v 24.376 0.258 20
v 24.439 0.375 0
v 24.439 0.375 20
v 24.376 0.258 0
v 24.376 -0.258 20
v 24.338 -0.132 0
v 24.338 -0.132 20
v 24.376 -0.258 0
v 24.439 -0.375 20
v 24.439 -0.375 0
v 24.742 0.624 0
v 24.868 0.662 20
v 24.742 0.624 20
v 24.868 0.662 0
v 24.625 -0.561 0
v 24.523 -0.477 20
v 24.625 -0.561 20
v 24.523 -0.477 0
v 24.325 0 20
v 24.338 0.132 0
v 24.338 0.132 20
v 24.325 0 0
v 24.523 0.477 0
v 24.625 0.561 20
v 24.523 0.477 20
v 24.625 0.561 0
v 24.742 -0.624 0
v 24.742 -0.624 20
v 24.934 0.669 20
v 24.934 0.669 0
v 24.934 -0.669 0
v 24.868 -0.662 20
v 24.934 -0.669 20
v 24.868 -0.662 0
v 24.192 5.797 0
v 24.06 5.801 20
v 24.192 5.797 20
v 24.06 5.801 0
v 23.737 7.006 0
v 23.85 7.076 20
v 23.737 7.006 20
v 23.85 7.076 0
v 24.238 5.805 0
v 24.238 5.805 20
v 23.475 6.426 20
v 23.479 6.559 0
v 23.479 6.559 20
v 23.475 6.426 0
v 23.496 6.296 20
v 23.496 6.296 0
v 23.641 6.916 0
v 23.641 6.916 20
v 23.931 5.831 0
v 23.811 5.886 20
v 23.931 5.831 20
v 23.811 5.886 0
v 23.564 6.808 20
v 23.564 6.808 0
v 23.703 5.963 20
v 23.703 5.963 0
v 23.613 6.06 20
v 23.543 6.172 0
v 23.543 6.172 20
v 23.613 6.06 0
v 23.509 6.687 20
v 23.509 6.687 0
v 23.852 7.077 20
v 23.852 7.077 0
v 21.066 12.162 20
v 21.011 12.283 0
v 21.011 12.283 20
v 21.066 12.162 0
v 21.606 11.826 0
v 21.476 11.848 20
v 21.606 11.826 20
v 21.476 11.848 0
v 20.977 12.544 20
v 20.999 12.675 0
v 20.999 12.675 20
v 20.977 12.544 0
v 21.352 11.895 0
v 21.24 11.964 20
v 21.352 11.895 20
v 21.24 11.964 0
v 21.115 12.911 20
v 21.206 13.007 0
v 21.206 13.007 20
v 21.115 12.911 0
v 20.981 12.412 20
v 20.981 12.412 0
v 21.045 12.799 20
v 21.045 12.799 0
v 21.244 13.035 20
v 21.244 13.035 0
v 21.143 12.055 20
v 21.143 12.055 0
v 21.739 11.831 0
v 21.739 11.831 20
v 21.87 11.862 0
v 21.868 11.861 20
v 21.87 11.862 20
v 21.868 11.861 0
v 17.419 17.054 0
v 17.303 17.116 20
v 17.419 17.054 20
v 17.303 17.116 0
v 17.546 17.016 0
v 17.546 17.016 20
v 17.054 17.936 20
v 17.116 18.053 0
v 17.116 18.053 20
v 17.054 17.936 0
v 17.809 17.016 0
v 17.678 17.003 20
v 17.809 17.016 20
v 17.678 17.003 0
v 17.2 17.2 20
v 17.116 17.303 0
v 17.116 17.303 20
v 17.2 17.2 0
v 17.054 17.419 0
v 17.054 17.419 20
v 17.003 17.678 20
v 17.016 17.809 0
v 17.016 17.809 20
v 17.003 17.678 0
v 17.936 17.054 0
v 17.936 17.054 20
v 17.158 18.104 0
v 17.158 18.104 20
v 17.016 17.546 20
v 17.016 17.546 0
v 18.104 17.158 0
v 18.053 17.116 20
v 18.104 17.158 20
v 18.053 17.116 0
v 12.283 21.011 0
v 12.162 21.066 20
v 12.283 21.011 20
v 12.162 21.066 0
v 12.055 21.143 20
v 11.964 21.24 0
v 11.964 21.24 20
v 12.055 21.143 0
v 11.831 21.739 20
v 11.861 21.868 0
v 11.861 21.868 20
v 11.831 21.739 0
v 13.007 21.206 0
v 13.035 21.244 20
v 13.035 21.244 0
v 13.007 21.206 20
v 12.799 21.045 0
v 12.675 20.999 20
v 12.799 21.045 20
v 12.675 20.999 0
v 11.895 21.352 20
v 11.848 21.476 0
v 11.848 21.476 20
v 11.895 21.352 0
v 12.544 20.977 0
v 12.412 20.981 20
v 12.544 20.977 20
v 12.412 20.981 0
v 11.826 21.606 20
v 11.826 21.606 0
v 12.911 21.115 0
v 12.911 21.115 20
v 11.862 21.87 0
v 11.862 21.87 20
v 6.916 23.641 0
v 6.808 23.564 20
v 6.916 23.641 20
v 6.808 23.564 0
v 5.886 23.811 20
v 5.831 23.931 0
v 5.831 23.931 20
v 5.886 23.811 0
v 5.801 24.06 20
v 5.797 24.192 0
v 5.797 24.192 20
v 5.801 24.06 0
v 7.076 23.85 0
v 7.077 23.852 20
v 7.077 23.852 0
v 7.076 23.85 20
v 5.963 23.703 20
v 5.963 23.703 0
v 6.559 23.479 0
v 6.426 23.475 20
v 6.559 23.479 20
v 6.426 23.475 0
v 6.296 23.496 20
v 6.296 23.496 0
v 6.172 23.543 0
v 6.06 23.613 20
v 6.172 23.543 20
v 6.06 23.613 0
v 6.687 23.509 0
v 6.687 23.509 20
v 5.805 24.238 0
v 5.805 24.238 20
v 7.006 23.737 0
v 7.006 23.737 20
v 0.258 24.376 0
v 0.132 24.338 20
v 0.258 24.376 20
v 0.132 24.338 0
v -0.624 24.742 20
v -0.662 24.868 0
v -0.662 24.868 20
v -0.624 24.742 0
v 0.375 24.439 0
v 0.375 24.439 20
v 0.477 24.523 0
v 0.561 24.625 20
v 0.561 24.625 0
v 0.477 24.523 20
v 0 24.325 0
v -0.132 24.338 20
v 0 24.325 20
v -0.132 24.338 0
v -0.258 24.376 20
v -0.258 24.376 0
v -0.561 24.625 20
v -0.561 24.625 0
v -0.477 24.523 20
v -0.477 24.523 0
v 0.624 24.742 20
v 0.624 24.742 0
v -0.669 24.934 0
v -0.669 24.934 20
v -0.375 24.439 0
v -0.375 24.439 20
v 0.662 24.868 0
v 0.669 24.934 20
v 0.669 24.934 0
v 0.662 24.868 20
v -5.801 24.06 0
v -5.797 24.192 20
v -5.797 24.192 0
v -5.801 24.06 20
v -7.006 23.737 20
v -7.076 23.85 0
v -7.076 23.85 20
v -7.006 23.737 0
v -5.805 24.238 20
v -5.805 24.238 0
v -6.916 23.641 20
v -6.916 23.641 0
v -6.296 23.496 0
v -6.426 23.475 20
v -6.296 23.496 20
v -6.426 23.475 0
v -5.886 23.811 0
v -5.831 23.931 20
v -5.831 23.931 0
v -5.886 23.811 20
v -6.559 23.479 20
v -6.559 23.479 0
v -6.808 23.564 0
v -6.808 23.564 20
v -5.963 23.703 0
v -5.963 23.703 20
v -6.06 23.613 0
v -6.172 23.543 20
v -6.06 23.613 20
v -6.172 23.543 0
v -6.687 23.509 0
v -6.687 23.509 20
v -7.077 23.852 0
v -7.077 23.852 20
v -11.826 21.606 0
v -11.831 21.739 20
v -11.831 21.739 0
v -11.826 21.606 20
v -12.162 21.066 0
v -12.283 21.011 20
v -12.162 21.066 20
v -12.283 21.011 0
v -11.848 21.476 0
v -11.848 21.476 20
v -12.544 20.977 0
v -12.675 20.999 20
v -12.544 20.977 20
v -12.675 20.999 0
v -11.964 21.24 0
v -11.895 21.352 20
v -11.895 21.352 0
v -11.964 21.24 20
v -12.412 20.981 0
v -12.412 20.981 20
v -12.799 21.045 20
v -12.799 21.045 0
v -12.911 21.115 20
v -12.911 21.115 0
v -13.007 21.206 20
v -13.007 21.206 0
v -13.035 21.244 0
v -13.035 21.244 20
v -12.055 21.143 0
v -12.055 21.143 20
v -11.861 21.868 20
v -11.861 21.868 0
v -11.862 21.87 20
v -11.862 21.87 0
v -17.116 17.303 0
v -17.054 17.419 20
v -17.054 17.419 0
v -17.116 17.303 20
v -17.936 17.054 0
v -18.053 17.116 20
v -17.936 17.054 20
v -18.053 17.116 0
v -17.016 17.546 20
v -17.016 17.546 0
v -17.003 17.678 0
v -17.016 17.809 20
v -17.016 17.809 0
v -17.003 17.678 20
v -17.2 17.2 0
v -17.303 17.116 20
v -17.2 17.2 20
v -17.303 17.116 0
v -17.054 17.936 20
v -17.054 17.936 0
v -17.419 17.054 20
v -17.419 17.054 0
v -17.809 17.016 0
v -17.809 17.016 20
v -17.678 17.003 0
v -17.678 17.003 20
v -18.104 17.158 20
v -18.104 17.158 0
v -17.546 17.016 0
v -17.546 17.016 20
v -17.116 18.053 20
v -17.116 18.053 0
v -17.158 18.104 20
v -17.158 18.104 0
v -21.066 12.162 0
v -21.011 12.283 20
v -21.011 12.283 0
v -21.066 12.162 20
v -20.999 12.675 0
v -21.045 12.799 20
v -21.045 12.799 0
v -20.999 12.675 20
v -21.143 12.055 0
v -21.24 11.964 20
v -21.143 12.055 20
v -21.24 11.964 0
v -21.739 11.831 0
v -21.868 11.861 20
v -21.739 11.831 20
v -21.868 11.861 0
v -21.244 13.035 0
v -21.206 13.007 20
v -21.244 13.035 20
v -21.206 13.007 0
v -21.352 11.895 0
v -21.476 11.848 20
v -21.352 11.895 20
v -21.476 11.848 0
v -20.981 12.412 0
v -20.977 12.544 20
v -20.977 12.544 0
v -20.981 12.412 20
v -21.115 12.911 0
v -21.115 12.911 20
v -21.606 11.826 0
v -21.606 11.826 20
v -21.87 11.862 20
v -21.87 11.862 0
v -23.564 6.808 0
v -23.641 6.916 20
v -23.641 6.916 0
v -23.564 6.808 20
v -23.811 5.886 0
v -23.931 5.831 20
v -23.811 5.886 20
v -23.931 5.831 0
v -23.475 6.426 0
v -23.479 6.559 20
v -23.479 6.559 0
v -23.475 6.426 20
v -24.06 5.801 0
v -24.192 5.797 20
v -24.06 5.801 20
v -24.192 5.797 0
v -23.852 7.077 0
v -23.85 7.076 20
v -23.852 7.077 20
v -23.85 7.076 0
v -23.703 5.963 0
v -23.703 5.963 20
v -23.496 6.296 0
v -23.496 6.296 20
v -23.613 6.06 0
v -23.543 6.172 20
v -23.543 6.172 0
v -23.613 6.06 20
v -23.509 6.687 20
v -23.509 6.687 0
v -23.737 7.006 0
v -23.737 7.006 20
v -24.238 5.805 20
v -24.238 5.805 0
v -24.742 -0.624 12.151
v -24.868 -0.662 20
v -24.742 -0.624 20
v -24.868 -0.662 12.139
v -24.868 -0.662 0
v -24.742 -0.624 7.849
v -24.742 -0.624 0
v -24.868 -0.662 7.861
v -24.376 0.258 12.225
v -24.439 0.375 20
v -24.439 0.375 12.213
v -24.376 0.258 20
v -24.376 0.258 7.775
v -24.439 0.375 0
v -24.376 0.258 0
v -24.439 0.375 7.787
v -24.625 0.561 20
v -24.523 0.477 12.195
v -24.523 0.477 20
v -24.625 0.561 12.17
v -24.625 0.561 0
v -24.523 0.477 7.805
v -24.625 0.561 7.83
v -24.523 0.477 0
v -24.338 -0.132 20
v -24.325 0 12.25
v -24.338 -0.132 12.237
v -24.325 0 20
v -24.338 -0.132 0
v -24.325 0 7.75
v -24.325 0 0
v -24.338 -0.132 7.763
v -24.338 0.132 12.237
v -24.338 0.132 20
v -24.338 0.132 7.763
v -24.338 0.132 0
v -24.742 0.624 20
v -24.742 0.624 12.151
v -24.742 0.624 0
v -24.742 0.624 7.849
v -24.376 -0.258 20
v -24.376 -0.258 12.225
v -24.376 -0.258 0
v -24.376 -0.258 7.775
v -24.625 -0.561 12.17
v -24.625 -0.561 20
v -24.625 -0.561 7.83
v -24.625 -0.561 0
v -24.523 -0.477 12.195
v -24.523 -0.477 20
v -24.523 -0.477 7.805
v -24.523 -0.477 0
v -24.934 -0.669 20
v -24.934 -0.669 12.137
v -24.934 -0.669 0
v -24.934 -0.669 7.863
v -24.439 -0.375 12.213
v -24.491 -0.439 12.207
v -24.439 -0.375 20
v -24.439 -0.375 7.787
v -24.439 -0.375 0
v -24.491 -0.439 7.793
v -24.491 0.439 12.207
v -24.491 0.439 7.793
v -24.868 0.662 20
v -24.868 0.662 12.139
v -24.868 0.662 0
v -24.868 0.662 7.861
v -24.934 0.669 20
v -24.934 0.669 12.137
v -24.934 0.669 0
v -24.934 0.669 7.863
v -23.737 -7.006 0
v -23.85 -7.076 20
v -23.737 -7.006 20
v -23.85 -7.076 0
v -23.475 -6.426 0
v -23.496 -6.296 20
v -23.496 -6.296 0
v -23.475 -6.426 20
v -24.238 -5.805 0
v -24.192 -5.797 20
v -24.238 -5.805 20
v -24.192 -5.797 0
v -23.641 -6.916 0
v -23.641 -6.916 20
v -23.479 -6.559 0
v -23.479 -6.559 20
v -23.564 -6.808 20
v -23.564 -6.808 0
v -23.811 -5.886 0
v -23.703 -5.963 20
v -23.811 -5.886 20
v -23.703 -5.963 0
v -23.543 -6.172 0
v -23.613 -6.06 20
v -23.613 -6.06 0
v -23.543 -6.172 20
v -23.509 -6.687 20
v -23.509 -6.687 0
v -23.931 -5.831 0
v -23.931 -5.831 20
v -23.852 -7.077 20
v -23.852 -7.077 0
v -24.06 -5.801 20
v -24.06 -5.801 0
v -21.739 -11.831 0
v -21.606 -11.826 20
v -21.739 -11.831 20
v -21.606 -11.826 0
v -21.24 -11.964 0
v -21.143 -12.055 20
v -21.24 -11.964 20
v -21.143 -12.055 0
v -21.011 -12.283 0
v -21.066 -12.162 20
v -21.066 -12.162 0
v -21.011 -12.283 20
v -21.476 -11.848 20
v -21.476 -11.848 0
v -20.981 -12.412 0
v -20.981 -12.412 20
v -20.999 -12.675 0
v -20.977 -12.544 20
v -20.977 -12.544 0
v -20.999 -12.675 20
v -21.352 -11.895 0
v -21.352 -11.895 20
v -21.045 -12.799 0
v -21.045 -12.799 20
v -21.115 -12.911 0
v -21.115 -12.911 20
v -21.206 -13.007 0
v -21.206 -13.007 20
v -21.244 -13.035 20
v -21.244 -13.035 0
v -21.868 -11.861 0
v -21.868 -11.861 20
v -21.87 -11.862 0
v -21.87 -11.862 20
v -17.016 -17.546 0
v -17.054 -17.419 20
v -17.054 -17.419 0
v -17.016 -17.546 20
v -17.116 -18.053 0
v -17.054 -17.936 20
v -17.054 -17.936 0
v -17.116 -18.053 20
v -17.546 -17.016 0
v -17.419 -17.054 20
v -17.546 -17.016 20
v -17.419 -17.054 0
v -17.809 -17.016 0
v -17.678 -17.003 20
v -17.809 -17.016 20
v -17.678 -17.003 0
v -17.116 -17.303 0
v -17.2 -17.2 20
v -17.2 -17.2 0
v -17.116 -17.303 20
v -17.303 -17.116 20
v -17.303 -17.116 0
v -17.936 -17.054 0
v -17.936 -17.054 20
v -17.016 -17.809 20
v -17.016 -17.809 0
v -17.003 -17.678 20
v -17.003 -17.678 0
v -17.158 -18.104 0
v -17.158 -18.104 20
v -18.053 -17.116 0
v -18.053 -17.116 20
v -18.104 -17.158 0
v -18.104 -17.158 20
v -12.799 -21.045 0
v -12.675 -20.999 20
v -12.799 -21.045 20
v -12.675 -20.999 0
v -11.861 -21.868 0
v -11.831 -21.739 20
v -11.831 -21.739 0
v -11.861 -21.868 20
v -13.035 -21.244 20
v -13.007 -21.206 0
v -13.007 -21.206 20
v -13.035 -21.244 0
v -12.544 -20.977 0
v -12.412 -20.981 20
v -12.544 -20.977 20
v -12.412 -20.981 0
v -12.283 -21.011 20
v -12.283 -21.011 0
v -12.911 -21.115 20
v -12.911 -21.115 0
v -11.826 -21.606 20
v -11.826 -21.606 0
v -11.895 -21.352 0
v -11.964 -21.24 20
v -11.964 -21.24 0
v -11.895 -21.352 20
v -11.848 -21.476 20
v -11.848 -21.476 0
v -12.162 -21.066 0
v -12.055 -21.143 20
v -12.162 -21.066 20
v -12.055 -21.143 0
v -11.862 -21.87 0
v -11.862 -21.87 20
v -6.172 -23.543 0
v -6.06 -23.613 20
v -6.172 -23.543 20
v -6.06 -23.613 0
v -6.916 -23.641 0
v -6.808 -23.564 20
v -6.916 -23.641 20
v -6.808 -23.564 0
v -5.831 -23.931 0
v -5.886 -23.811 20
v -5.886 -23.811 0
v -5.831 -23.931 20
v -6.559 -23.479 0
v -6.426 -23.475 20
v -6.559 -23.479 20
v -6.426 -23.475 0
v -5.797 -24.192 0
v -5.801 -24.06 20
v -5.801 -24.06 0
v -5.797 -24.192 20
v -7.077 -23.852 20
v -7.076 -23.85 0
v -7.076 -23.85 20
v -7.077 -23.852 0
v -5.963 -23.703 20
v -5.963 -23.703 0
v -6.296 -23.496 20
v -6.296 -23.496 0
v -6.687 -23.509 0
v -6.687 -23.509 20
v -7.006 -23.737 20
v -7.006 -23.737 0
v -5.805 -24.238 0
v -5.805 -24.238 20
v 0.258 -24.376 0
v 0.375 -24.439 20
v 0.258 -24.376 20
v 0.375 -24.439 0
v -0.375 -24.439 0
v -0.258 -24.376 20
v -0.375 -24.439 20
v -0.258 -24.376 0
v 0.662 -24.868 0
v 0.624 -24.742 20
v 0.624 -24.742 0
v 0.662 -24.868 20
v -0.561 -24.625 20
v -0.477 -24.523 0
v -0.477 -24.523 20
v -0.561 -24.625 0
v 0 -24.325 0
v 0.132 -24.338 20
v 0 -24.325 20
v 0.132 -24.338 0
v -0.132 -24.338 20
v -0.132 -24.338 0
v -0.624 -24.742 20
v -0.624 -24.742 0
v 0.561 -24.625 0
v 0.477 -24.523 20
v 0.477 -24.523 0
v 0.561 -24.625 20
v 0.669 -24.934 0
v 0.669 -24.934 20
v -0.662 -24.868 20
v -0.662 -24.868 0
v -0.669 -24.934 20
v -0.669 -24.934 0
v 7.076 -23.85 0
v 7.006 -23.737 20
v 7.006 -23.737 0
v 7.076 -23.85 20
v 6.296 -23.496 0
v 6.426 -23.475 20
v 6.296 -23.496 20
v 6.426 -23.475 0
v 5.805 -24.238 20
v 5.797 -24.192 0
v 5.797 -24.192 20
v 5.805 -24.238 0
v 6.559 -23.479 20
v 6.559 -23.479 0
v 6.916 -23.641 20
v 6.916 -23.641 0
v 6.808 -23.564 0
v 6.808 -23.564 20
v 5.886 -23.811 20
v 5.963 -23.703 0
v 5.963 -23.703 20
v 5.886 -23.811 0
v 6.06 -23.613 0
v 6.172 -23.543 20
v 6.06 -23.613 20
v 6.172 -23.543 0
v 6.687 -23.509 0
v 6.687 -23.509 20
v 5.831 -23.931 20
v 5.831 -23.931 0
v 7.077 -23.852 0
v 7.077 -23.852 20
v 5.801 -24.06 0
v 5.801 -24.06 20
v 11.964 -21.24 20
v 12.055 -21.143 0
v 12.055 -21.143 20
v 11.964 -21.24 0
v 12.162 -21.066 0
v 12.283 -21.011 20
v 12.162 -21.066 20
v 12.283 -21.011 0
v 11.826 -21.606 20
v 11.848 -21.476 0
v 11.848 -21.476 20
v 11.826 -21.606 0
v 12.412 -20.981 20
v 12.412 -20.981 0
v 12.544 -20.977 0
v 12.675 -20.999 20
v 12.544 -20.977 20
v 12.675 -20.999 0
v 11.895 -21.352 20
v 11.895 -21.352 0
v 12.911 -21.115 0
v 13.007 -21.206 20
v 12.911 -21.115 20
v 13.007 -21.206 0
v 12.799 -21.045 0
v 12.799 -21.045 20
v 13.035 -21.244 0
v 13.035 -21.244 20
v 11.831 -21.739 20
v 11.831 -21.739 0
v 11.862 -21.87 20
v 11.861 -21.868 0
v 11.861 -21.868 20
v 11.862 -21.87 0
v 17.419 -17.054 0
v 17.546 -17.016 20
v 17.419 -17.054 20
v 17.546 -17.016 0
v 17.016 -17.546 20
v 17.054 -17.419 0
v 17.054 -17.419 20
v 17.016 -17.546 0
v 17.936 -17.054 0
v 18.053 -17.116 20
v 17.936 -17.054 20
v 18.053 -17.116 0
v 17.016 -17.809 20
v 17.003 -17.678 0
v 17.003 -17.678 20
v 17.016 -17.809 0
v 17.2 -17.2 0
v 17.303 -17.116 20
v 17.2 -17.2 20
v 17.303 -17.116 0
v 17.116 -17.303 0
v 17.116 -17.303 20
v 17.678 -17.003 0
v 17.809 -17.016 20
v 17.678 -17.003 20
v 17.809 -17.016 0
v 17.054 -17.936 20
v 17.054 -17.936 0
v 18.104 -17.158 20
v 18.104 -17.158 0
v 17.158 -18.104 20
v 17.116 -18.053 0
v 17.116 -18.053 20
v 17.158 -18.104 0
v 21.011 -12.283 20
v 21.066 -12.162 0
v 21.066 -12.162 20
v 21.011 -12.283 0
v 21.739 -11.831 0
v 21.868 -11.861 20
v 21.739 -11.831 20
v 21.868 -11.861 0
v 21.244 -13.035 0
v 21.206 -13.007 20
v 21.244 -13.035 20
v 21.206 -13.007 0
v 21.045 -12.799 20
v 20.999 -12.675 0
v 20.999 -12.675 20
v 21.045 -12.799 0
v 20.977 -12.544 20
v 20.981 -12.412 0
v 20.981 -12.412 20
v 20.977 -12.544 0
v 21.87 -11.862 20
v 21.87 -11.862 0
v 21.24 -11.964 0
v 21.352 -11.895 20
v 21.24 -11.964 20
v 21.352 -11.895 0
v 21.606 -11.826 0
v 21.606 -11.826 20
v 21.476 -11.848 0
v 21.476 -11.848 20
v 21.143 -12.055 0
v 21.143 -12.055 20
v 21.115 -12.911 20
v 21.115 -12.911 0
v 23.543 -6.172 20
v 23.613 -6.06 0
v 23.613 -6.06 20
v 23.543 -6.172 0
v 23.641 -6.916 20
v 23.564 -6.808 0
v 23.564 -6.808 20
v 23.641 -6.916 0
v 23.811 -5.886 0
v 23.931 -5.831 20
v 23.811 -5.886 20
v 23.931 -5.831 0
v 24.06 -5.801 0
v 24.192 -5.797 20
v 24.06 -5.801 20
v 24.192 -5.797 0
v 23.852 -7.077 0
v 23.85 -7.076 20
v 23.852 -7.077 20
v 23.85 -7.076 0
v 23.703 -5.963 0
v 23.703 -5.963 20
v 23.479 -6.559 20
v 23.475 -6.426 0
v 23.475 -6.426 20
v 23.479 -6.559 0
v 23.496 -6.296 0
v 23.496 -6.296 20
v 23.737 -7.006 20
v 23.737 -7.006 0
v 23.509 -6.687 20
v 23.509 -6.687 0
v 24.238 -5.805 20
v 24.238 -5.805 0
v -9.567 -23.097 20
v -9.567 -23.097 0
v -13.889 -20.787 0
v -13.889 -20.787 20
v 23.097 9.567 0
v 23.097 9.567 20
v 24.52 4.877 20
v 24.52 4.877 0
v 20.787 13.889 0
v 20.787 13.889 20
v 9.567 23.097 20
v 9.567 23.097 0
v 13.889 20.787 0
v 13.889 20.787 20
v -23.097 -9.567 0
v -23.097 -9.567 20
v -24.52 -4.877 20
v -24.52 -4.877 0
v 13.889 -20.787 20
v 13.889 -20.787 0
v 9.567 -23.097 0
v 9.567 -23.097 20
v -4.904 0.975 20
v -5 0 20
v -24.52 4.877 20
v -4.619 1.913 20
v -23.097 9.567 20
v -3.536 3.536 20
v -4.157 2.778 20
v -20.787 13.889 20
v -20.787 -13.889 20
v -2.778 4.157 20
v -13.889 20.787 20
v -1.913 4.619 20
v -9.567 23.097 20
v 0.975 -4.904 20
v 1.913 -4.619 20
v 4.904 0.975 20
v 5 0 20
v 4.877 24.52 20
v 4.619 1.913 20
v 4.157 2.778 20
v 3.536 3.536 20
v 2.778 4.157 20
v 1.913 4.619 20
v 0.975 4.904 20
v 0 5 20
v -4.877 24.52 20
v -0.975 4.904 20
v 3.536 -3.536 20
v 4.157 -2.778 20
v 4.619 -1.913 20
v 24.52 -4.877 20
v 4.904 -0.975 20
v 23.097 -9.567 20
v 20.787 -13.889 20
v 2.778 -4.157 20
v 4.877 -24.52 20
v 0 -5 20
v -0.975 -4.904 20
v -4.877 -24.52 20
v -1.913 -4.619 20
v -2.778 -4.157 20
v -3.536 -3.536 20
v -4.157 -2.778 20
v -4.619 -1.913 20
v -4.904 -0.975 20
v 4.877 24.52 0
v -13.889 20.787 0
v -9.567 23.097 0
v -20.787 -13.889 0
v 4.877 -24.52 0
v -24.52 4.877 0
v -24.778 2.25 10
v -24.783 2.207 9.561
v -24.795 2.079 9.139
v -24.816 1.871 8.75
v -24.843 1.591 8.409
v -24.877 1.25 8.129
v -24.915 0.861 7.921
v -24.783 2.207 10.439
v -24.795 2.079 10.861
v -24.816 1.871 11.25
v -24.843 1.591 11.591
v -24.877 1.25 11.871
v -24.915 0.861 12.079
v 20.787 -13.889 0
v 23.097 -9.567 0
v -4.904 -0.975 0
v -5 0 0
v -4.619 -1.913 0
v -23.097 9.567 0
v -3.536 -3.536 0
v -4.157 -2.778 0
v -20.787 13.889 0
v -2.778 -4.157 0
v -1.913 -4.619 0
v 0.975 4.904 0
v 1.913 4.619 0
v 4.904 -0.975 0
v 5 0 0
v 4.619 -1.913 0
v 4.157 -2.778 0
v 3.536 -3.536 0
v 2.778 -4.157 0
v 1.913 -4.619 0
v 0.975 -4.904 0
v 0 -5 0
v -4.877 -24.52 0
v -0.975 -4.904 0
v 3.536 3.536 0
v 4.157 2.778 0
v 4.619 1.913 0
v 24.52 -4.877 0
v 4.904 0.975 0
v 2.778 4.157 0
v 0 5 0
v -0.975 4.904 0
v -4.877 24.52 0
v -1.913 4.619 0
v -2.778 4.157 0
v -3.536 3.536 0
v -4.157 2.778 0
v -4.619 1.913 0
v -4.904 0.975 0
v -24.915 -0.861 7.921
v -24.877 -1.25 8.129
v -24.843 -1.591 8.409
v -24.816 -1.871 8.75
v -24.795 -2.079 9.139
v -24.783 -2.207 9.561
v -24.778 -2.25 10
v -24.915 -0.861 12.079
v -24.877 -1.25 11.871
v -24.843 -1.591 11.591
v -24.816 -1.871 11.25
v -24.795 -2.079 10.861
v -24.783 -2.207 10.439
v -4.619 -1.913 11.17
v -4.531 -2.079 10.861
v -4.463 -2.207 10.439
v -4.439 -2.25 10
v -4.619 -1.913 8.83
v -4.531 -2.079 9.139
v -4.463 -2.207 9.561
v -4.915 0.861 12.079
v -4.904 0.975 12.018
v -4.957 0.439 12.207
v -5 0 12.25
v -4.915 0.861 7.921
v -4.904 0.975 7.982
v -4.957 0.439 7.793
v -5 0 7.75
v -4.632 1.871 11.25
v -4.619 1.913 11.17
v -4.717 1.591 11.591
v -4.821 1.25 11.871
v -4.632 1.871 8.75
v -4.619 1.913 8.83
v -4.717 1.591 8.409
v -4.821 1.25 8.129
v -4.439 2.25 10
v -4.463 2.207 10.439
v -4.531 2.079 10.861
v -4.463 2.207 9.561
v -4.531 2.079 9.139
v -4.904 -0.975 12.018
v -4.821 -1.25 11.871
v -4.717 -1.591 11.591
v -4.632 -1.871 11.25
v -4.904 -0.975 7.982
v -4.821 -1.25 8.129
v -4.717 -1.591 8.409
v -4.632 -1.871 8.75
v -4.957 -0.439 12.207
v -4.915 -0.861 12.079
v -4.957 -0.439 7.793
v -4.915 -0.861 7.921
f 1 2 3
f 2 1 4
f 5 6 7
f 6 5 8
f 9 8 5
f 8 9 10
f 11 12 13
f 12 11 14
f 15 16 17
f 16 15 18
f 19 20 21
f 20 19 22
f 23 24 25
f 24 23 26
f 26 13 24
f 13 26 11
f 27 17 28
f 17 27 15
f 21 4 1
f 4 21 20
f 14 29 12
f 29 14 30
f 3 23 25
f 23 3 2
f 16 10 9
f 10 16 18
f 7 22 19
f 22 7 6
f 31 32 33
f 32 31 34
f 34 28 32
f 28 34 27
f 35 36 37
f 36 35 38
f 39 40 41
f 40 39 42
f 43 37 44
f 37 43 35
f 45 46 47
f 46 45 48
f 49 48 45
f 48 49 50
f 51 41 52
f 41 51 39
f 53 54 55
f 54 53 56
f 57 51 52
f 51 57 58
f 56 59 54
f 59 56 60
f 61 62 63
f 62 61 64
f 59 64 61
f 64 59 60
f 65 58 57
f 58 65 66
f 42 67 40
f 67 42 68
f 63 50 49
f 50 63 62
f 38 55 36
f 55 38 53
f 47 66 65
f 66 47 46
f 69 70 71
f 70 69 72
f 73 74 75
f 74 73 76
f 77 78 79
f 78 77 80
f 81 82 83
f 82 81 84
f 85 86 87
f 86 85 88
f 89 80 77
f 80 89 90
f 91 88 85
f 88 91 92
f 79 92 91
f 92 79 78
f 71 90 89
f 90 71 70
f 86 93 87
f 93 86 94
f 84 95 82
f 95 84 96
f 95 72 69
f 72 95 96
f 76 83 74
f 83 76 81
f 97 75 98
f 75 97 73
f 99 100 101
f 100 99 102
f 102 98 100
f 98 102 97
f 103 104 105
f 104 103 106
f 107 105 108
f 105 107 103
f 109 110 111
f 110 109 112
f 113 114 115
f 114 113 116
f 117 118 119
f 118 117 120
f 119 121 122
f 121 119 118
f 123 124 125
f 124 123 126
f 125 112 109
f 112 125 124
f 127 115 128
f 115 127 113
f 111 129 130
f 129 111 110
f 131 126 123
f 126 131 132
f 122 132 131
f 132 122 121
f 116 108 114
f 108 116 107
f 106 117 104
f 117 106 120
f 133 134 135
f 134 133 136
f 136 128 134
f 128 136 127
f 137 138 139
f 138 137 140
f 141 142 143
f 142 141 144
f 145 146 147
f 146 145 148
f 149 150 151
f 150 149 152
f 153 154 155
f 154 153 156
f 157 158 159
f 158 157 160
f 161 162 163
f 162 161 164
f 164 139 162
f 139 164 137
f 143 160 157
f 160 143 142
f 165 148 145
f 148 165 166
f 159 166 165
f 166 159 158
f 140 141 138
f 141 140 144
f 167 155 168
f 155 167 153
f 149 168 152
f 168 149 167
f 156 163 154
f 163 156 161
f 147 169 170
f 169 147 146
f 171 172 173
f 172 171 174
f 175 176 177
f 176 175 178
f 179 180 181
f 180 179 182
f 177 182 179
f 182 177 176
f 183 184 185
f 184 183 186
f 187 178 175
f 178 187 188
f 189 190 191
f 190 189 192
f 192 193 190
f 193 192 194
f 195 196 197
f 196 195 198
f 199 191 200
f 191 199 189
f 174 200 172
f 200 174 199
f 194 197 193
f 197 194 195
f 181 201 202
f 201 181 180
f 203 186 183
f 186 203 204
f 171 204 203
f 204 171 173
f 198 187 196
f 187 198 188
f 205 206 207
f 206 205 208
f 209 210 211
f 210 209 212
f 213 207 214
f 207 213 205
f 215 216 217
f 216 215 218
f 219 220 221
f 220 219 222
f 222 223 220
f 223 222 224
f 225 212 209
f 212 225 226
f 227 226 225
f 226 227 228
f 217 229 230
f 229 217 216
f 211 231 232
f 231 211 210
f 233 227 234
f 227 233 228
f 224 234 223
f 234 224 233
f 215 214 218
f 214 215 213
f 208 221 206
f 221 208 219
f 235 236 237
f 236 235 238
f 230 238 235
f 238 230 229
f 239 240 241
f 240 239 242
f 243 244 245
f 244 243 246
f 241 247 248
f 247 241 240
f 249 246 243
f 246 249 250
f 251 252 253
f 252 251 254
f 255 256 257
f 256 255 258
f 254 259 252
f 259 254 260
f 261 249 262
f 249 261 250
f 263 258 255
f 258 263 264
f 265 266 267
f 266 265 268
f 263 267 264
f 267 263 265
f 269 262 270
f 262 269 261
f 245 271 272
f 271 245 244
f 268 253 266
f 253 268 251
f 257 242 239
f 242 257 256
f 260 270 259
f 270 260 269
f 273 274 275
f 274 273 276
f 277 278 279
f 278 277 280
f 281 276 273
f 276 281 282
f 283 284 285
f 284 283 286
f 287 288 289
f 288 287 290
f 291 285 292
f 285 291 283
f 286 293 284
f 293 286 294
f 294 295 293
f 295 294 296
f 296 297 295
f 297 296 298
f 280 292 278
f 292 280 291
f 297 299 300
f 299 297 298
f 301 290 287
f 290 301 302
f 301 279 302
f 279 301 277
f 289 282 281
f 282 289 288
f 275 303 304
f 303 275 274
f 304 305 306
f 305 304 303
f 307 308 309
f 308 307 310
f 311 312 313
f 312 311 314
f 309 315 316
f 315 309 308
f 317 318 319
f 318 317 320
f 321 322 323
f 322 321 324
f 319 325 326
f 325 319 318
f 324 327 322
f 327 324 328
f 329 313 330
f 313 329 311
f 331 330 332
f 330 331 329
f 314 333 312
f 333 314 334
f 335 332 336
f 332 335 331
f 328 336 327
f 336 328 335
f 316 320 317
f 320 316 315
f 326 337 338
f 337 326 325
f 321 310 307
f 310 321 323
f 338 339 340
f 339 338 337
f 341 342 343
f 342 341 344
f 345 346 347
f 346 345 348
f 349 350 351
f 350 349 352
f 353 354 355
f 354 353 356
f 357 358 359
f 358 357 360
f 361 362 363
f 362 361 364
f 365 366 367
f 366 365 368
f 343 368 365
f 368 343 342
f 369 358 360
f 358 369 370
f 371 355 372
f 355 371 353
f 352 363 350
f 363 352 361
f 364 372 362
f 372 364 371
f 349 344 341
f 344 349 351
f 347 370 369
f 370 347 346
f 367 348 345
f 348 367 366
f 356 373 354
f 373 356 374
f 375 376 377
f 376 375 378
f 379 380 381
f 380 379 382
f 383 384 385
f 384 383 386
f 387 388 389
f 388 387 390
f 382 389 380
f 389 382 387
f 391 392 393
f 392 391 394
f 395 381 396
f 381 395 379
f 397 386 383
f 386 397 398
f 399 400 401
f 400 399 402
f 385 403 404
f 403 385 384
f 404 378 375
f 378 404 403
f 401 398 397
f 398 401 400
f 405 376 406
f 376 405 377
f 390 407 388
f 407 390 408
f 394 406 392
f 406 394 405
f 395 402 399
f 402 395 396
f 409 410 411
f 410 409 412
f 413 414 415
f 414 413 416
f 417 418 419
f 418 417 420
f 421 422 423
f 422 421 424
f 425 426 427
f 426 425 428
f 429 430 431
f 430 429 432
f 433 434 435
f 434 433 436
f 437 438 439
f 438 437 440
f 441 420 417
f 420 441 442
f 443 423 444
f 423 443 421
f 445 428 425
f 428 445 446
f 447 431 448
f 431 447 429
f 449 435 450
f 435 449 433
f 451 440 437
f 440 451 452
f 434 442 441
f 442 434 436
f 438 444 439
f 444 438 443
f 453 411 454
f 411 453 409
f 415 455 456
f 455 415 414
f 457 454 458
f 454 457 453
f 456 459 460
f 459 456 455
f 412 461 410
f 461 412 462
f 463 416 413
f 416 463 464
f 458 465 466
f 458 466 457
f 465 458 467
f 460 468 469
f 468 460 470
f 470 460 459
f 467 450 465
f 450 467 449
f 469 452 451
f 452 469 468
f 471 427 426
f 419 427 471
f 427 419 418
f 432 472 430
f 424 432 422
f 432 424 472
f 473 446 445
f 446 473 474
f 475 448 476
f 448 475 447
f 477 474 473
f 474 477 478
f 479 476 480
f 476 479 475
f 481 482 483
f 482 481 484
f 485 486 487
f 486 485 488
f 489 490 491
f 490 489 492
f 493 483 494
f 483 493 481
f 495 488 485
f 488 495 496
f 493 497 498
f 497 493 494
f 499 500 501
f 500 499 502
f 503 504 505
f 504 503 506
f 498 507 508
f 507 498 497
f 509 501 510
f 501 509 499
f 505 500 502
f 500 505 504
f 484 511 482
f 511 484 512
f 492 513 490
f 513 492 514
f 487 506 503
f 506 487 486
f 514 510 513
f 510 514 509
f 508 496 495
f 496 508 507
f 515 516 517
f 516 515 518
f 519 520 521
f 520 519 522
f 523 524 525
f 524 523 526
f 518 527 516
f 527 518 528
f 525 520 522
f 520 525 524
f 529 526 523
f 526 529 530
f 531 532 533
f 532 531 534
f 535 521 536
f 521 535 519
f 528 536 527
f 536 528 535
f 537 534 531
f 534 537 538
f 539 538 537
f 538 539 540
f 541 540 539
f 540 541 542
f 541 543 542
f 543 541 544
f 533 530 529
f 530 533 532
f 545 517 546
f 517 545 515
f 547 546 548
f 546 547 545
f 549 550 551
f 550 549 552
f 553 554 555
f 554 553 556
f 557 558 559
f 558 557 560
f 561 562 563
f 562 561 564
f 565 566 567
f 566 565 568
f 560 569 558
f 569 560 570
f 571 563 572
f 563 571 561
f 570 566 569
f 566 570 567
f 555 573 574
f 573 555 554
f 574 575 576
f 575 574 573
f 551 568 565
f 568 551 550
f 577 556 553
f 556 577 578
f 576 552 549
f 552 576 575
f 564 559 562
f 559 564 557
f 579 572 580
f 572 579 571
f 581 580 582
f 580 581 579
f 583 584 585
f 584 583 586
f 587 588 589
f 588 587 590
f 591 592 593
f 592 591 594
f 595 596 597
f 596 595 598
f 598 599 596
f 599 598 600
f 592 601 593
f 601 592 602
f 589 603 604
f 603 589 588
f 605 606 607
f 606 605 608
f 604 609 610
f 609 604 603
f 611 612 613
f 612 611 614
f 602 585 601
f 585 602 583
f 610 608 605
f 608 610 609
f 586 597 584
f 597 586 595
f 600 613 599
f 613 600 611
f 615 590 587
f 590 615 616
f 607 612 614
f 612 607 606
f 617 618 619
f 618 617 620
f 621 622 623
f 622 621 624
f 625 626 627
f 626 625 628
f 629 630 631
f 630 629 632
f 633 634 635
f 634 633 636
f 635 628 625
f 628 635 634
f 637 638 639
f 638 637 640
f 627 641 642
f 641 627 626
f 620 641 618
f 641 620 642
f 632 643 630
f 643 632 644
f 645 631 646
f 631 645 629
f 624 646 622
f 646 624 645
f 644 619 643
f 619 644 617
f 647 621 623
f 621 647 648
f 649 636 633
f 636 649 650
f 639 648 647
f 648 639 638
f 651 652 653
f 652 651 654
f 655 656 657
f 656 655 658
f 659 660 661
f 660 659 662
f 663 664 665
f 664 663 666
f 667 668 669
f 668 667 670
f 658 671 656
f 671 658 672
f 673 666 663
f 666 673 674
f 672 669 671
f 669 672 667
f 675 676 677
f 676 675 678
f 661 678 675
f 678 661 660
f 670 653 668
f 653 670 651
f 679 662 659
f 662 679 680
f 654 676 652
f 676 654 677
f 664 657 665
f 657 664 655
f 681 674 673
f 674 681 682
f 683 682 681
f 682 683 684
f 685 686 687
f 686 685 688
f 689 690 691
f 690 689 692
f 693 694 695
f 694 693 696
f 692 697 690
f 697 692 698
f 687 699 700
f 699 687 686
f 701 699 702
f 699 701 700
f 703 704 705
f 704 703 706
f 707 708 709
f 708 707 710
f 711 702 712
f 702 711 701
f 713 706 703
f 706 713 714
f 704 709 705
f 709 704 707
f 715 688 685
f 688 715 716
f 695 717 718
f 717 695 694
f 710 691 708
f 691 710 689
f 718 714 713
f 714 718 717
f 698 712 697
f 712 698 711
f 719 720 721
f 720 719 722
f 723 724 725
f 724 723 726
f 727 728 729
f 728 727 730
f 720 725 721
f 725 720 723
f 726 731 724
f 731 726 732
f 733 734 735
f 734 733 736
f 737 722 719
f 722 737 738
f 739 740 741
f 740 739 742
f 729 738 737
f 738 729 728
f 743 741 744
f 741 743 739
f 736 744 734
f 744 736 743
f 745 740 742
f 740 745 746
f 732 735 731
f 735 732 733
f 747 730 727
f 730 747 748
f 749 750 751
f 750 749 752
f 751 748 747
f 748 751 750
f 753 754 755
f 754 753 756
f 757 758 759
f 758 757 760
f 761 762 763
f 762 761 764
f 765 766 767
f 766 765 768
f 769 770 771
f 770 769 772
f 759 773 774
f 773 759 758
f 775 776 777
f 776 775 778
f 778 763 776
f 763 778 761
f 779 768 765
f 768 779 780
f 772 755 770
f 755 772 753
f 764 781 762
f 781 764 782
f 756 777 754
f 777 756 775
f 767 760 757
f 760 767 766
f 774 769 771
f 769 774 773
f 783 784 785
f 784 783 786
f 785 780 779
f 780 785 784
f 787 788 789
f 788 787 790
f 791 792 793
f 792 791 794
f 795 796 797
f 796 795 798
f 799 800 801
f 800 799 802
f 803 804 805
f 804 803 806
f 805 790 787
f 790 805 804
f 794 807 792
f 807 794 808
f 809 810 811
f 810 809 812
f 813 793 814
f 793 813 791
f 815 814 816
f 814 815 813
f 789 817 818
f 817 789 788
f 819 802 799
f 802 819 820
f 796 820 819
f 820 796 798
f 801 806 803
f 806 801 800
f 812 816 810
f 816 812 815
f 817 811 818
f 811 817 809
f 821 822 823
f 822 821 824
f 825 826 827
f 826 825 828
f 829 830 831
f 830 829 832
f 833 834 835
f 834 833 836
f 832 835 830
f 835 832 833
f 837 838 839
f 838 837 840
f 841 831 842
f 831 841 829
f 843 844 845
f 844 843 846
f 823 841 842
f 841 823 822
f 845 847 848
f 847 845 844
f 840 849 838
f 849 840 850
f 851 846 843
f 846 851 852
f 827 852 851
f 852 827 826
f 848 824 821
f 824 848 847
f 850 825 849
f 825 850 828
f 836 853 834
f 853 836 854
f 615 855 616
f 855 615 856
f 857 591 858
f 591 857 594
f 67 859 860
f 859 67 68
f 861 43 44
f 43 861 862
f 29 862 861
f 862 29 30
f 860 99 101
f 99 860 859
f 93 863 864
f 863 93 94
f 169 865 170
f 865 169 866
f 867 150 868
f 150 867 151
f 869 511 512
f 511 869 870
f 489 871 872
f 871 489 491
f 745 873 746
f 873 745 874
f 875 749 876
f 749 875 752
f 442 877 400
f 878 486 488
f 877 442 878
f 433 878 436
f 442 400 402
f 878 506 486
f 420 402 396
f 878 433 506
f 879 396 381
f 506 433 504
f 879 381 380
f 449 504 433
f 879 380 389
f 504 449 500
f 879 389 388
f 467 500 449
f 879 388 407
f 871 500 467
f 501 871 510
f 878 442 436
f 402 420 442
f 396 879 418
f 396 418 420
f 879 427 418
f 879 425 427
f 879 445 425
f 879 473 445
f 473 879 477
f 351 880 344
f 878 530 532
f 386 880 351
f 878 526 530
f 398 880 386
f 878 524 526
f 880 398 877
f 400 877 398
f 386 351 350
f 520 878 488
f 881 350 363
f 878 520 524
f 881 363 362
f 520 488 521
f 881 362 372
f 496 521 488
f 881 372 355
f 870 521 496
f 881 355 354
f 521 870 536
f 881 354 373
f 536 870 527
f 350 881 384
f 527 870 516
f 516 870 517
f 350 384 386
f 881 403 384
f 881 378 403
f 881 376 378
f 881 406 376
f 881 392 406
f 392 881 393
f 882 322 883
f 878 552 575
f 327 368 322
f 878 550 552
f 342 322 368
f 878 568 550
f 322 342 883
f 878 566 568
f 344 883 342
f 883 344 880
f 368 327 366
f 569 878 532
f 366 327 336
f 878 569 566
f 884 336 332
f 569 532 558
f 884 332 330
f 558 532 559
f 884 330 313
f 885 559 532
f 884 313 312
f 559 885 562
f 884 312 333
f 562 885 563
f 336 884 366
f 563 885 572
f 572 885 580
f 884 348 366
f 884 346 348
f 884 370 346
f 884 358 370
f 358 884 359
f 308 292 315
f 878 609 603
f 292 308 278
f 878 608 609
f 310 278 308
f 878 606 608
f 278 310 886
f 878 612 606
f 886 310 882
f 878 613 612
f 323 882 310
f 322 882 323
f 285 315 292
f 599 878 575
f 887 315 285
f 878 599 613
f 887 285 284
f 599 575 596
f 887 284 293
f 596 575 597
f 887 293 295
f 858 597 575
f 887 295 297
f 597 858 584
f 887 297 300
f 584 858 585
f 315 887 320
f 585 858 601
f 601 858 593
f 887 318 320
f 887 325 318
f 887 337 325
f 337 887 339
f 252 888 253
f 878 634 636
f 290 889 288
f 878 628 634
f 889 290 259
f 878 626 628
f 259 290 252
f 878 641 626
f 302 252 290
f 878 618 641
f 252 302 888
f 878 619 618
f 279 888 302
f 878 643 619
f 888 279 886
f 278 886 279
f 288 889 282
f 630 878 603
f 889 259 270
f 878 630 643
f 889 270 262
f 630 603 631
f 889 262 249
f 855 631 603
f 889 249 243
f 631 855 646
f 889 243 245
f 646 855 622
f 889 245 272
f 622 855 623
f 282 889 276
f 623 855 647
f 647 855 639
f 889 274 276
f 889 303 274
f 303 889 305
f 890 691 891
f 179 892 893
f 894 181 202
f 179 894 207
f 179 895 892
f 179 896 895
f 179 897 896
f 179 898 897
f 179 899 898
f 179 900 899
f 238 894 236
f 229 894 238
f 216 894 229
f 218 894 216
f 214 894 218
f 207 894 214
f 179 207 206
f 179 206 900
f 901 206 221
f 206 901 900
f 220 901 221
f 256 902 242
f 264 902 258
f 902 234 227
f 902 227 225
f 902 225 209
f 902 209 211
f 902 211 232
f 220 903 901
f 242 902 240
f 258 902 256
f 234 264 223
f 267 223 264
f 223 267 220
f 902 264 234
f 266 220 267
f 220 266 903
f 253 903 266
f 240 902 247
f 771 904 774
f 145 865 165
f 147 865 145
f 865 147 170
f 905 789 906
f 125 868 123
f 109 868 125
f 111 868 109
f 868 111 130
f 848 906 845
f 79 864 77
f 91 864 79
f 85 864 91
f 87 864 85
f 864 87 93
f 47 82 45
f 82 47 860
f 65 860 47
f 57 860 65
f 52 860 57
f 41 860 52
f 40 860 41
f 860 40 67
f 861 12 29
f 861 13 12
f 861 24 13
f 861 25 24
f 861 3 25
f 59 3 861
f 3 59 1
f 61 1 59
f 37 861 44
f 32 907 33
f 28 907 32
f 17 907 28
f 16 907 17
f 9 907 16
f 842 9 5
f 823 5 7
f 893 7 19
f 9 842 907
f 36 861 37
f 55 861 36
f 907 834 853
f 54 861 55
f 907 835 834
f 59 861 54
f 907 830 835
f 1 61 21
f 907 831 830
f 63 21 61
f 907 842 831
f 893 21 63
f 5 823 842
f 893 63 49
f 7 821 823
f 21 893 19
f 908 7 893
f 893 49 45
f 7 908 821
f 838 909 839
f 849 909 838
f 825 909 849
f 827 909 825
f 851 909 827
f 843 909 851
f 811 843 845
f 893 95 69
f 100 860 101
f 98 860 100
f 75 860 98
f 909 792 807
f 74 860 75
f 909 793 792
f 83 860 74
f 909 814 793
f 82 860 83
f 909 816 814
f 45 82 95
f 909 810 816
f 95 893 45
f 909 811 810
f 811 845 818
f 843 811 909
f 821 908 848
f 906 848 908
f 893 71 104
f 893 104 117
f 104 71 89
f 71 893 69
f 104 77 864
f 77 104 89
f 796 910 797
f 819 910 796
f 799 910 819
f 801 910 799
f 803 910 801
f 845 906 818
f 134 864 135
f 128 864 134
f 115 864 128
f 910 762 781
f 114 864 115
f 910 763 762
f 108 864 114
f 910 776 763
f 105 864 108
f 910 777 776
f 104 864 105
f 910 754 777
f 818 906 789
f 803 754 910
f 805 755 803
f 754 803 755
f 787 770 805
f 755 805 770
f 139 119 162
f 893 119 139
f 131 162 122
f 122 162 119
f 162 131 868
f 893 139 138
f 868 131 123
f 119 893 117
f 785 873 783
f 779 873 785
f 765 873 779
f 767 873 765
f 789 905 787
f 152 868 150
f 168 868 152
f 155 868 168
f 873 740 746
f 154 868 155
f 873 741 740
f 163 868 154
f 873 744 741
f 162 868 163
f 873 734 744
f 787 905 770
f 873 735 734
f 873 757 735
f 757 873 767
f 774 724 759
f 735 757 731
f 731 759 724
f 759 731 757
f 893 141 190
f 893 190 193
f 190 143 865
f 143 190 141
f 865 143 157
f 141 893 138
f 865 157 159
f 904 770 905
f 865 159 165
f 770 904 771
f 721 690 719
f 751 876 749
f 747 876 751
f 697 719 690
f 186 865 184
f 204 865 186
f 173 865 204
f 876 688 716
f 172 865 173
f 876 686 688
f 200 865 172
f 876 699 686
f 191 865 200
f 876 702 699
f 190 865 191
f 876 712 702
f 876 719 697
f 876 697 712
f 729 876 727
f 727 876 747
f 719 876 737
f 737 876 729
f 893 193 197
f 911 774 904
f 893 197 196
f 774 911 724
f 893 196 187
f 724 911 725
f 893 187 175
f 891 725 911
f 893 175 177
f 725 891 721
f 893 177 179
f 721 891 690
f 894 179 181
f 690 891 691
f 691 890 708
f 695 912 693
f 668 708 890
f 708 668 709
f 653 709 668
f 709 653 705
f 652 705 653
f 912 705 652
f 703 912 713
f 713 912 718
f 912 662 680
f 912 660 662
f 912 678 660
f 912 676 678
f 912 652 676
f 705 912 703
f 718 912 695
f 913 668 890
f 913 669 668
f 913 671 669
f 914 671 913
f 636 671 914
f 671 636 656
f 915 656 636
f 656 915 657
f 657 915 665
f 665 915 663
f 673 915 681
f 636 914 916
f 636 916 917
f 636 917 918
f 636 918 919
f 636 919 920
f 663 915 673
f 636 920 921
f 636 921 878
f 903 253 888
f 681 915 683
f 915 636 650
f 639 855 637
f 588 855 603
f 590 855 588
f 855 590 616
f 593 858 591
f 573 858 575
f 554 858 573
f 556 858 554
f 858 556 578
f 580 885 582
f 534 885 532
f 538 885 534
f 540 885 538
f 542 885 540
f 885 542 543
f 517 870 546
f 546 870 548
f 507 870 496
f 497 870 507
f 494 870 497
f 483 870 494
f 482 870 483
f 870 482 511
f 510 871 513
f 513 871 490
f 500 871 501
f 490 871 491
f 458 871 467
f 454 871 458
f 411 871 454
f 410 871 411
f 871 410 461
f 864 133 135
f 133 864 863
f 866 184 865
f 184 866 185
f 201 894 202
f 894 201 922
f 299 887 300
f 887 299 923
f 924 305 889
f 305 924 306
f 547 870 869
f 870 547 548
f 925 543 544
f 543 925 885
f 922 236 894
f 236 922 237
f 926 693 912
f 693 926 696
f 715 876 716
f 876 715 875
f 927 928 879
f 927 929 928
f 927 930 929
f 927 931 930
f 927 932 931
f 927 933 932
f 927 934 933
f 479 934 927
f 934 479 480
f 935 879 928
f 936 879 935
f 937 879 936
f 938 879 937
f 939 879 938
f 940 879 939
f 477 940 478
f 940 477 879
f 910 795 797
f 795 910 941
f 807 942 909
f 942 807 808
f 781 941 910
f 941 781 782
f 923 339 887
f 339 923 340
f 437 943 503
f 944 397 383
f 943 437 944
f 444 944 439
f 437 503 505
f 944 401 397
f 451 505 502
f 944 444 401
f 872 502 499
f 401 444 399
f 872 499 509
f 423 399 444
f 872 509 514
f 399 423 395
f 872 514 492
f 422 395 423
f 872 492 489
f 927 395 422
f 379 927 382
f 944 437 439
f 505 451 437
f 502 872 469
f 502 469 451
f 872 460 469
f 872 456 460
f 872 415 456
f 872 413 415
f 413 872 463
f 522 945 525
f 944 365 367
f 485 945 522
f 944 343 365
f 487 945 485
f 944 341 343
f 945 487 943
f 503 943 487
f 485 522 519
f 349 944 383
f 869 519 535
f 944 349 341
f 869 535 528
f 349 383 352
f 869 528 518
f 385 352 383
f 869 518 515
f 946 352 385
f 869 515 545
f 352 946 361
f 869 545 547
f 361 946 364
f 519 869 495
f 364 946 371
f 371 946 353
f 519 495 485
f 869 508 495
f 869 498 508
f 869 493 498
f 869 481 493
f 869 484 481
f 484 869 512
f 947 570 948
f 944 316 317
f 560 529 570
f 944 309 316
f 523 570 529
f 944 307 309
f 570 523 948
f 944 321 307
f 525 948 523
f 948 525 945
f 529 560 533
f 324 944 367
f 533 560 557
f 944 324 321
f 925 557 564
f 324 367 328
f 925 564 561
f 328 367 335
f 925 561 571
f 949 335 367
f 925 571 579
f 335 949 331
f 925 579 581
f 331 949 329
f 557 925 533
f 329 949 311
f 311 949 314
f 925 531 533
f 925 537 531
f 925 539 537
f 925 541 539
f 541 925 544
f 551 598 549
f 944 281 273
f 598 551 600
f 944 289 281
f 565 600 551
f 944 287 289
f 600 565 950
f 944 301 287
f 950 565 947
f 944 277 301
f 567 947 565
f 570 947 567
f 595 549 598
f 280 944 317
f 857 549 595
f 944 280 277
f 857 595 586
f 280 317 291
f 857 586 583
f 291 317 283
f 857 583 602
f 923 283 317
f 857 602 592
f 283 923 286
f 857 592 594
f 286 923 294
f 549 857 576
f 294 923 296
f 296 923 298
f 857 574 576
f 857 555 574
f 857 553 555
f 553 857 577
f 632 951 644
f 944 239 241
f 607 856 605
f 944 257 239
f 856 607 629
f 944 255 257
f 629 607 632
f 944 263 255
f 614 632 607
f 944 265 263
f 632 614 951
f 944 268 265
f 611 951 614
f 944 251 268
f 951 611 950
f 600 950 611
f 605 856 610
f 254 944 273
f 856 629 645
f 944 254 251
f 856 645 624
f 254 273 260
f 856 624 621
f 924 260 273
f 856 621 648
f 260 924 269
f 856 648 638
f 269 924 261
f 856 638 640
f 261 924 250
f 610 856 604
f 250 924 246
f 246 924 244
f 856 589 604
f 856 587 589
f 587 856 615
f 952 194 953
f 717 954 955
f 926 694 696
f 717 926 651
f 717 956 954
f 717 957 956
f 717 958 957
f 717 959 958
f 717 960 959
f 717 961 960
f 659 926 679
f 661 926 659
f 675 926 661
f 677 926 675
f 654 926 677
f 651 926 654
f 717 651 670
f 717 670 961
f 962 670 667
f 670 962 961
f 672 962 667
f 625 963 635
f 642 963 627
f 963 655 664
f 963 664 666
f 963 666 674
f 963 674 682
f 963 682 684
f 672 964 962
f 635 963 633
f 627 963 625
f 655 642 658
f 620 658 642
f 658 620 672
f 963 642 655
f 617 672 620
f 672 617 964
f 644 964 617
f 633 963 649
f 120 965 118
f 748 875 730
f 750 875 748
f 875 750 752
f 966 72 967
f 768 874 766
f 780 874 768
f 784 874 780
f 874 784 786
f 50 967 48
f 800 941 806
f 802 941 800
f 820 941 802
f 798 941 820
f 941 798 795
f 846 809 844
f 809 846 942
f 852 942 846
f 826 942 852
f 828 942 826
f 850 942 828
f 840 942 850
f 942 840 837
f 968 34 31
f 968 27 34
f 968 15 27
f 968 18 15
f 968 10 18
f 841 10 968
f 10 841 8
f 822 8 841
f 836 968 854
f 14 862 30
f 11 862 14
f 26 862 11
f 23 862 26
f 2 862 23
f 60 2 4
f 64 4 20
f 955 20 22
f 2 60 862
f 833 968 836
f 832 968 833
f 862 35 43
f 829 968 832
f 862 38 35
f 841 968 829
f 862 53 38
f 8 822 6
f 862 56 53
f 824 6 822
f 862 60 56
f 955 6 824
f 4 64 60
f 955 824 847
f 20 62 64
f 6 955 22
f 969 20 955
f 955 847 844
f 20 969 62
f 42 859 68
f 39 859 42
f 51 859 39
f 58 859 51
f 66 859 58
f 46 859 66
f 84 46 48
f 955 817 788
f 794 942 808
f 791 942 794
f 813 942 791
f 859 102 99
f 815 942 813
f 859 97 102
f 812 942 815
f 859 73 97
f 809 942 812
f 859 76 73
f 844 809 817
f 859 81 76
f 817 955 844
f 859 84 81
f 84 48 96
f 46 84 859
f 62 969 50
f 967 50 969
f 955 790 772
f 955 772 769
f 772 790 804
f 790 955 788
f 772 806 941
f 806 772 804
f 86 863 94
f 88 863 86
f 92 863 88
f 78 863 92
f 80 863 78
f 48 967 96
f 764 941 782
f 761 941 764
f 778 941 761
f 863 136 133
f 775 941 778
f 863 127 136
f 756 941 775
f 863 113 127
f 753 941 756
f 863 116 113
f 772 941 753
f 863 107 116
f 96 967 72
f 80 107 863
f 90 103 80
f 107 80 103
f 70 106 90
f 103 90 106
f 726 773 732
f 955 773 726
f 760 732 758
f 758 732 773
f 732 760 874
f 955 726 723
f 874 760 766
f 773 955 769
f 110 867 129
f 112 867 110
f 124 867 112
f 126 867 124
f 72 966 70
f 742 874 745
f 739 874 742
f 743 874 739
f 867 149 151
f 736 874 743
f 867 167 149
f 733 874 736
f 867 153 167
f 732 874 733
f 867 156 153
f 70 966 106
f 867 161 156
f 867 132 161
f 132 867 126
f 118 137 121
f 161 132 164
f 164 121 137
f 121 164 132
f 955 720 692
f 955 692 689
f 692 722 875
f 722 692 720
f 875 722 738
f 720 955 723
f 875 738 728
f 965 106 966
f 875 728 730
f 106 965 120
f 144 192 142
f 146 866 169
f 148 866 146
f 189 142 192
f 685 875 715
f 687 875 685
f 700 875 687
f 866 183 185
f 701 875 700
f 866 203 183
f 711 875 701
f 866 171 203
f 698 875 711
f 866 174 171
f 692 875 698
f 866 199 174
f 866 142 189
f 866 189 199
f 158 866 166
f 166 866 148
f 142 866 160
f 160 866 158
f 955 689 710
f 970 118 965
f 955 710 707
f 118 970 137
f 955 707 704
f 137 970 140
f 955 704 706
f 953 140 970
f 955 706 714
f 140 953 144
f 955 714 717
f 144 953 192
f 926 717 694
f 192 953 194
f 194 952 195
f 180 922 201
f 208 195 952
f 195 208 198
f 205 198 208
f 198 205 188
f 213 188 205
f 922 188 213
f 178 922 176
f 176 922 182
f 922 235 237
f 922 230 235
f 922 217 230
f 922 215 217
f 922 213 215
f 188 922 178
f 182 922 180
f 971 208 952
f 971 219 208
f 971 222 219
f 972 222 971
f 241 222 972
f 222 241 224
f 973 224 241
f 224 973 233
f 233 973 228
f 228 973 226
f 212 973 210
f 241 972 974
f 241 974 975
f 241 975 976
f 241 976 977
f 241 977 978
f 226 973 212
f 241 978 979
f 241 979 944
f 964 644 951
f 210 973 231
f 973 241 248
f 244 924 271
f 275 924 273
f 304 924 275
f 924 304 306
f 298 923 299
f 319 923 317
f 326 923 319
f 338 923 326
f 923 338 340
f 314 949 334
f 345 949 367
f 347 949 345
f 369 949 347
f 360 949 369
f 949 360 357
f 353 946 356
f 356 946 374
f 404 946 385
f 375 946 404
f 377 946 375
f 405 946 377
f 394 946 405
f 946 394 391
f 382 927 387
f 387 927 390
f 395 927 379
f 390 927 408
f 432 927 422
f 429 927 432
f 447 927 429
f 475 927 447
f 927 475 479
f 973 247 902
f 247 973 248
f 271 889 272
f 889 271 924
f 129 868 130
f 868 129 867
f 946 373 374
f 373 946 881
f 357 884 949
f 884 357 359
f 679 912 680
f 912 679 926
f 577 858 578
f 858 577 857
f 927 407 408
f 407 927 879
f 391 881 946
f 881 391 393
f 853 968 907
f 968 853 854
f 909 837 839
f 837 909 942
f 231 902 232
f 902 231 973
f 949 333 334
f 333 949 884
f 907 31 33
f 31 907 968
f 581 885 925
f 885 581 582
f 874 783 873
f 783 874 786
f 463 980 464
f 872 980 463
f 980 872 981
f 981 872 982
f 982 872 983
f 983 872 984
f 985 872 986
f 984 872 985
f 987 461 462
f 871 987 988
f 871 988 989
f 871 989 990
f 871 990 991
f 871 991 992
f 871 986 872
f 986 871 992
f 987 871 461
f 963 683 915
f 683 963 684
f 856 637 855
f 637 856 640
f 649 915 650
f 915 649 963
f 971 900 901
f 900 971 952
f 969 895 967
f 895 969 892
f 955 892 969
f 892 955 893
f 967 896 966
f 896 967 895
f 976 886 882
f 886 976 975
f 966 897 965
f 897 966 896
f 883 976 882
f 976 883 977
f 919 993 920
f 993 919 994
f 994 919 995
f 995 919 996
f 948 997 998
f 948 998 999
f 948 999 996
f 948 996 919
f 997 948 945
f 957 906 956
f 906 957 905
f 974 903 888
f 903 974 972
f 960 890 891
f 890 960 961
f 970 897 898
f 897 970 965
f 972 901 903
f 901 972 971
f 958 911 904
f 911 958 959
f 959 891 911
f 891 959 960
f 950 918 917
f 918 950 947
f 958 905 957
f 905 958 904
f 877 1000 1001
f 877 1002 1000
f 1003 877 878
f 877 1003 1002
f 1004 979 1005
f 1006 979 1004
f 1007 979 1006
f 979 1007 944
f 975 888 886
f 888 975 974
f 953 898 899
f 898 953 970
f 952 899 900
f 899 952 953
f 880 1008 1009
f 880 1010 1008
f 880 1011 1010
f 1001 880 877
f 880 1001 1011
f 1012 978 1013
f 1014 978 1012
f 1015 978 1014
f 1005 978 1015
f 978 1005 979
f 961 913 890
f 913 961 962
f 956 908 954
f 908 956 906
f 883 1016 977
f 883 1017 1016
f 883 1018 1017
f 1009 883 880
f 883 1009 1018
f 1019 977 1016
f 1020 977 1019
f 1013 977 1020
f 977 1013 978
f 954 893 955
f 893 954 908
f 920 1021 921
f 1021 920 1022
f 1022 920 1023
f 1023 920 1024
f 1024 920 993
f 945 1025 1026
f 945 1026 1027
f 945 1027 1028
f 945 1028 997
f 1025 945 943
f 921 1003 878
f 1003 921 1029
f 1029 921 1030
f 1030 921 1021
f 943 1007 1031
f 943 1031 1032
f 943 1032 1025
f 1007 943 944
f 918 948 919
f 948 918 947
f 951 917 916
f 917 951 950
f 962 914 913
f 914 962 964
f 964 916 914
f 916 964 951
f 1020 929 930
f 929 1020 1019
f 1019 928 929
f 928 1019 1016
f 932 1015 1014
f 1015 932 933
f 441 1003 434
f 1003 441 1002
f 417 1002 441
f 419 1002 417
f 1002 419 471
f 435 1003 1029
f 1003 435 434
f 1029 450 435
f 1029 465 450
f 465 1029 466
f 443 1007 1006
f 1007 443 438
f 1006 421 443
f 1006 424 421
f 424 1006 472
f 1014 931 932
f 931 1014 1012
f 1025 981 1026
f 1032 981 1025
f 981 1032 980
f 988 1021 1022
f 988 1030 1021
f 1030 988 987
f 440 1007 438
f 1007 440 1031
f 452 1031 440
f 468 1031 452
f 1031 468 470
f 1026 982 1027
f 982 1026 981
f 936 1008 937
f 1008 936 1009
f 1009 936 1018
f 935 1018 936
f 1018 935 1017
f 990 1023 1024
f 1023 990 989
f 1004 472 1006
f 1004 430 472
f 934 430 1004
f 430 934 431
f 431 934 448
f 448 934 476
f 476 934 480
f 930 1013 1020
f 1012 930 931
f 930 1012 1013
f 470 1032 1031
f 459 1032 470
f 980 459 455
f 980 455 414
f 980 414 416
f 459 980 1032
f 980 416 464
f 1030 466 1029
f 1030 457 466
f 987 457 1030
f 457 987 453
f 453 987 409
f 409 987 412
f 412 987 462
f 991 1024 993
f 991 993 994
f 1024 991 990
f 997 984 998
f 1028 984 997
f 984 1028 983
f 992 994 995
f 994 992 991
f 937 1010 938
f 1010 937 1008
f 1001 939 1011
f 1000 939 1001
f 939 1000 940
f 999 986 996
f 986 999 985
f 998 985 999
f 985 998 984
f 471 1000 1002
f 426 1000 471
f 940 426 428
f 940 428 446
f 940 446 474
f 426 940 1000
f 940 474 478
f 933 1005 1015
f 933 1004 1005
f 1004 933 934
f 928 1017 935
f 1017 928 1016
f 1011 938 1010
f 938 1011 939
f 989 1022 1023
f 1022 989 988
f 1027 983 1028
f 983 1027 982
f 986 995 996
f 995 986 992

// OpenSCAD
$fn = 32;

// ----------------------------------------------------------------------
// Hand knob: 50 x 50 x 20 mm
// ----------------------------------------------------------------------

// --- parameters (mm) ---
head_d = 50;              // knob diameter
head_h = 20;              // knob height
hole_d = 10;              // shaft bore
set_d = 4.5;              // set screw tap hole
notch_d = 1.35;           // knurl groove diameter
knurl_n = 24;             // number of knurl grooves

module body() {
  cylinder(h = head_h, d = head_d);
}

difference() {
  union() {
    body();
  }
  translate([0, 0, -1]) cylinder(h = head_h + 0 + 2, d = hole_d);
  /* knurl grooves */
  for (i = [0 : knurl_n - 1])
    rotate([0, 0, i * 360 / knurl_n])
      translate([head_d / 2, 0, -0.5])
        cylinder(h = head_h + 1, d = notch_d);
  translate([-head_d / 2 - 1, 0, head_h * 0.5]) rotate([0, 90, 0]) cylinder(h = head_d / 2 + 2, d = set_d);
}
